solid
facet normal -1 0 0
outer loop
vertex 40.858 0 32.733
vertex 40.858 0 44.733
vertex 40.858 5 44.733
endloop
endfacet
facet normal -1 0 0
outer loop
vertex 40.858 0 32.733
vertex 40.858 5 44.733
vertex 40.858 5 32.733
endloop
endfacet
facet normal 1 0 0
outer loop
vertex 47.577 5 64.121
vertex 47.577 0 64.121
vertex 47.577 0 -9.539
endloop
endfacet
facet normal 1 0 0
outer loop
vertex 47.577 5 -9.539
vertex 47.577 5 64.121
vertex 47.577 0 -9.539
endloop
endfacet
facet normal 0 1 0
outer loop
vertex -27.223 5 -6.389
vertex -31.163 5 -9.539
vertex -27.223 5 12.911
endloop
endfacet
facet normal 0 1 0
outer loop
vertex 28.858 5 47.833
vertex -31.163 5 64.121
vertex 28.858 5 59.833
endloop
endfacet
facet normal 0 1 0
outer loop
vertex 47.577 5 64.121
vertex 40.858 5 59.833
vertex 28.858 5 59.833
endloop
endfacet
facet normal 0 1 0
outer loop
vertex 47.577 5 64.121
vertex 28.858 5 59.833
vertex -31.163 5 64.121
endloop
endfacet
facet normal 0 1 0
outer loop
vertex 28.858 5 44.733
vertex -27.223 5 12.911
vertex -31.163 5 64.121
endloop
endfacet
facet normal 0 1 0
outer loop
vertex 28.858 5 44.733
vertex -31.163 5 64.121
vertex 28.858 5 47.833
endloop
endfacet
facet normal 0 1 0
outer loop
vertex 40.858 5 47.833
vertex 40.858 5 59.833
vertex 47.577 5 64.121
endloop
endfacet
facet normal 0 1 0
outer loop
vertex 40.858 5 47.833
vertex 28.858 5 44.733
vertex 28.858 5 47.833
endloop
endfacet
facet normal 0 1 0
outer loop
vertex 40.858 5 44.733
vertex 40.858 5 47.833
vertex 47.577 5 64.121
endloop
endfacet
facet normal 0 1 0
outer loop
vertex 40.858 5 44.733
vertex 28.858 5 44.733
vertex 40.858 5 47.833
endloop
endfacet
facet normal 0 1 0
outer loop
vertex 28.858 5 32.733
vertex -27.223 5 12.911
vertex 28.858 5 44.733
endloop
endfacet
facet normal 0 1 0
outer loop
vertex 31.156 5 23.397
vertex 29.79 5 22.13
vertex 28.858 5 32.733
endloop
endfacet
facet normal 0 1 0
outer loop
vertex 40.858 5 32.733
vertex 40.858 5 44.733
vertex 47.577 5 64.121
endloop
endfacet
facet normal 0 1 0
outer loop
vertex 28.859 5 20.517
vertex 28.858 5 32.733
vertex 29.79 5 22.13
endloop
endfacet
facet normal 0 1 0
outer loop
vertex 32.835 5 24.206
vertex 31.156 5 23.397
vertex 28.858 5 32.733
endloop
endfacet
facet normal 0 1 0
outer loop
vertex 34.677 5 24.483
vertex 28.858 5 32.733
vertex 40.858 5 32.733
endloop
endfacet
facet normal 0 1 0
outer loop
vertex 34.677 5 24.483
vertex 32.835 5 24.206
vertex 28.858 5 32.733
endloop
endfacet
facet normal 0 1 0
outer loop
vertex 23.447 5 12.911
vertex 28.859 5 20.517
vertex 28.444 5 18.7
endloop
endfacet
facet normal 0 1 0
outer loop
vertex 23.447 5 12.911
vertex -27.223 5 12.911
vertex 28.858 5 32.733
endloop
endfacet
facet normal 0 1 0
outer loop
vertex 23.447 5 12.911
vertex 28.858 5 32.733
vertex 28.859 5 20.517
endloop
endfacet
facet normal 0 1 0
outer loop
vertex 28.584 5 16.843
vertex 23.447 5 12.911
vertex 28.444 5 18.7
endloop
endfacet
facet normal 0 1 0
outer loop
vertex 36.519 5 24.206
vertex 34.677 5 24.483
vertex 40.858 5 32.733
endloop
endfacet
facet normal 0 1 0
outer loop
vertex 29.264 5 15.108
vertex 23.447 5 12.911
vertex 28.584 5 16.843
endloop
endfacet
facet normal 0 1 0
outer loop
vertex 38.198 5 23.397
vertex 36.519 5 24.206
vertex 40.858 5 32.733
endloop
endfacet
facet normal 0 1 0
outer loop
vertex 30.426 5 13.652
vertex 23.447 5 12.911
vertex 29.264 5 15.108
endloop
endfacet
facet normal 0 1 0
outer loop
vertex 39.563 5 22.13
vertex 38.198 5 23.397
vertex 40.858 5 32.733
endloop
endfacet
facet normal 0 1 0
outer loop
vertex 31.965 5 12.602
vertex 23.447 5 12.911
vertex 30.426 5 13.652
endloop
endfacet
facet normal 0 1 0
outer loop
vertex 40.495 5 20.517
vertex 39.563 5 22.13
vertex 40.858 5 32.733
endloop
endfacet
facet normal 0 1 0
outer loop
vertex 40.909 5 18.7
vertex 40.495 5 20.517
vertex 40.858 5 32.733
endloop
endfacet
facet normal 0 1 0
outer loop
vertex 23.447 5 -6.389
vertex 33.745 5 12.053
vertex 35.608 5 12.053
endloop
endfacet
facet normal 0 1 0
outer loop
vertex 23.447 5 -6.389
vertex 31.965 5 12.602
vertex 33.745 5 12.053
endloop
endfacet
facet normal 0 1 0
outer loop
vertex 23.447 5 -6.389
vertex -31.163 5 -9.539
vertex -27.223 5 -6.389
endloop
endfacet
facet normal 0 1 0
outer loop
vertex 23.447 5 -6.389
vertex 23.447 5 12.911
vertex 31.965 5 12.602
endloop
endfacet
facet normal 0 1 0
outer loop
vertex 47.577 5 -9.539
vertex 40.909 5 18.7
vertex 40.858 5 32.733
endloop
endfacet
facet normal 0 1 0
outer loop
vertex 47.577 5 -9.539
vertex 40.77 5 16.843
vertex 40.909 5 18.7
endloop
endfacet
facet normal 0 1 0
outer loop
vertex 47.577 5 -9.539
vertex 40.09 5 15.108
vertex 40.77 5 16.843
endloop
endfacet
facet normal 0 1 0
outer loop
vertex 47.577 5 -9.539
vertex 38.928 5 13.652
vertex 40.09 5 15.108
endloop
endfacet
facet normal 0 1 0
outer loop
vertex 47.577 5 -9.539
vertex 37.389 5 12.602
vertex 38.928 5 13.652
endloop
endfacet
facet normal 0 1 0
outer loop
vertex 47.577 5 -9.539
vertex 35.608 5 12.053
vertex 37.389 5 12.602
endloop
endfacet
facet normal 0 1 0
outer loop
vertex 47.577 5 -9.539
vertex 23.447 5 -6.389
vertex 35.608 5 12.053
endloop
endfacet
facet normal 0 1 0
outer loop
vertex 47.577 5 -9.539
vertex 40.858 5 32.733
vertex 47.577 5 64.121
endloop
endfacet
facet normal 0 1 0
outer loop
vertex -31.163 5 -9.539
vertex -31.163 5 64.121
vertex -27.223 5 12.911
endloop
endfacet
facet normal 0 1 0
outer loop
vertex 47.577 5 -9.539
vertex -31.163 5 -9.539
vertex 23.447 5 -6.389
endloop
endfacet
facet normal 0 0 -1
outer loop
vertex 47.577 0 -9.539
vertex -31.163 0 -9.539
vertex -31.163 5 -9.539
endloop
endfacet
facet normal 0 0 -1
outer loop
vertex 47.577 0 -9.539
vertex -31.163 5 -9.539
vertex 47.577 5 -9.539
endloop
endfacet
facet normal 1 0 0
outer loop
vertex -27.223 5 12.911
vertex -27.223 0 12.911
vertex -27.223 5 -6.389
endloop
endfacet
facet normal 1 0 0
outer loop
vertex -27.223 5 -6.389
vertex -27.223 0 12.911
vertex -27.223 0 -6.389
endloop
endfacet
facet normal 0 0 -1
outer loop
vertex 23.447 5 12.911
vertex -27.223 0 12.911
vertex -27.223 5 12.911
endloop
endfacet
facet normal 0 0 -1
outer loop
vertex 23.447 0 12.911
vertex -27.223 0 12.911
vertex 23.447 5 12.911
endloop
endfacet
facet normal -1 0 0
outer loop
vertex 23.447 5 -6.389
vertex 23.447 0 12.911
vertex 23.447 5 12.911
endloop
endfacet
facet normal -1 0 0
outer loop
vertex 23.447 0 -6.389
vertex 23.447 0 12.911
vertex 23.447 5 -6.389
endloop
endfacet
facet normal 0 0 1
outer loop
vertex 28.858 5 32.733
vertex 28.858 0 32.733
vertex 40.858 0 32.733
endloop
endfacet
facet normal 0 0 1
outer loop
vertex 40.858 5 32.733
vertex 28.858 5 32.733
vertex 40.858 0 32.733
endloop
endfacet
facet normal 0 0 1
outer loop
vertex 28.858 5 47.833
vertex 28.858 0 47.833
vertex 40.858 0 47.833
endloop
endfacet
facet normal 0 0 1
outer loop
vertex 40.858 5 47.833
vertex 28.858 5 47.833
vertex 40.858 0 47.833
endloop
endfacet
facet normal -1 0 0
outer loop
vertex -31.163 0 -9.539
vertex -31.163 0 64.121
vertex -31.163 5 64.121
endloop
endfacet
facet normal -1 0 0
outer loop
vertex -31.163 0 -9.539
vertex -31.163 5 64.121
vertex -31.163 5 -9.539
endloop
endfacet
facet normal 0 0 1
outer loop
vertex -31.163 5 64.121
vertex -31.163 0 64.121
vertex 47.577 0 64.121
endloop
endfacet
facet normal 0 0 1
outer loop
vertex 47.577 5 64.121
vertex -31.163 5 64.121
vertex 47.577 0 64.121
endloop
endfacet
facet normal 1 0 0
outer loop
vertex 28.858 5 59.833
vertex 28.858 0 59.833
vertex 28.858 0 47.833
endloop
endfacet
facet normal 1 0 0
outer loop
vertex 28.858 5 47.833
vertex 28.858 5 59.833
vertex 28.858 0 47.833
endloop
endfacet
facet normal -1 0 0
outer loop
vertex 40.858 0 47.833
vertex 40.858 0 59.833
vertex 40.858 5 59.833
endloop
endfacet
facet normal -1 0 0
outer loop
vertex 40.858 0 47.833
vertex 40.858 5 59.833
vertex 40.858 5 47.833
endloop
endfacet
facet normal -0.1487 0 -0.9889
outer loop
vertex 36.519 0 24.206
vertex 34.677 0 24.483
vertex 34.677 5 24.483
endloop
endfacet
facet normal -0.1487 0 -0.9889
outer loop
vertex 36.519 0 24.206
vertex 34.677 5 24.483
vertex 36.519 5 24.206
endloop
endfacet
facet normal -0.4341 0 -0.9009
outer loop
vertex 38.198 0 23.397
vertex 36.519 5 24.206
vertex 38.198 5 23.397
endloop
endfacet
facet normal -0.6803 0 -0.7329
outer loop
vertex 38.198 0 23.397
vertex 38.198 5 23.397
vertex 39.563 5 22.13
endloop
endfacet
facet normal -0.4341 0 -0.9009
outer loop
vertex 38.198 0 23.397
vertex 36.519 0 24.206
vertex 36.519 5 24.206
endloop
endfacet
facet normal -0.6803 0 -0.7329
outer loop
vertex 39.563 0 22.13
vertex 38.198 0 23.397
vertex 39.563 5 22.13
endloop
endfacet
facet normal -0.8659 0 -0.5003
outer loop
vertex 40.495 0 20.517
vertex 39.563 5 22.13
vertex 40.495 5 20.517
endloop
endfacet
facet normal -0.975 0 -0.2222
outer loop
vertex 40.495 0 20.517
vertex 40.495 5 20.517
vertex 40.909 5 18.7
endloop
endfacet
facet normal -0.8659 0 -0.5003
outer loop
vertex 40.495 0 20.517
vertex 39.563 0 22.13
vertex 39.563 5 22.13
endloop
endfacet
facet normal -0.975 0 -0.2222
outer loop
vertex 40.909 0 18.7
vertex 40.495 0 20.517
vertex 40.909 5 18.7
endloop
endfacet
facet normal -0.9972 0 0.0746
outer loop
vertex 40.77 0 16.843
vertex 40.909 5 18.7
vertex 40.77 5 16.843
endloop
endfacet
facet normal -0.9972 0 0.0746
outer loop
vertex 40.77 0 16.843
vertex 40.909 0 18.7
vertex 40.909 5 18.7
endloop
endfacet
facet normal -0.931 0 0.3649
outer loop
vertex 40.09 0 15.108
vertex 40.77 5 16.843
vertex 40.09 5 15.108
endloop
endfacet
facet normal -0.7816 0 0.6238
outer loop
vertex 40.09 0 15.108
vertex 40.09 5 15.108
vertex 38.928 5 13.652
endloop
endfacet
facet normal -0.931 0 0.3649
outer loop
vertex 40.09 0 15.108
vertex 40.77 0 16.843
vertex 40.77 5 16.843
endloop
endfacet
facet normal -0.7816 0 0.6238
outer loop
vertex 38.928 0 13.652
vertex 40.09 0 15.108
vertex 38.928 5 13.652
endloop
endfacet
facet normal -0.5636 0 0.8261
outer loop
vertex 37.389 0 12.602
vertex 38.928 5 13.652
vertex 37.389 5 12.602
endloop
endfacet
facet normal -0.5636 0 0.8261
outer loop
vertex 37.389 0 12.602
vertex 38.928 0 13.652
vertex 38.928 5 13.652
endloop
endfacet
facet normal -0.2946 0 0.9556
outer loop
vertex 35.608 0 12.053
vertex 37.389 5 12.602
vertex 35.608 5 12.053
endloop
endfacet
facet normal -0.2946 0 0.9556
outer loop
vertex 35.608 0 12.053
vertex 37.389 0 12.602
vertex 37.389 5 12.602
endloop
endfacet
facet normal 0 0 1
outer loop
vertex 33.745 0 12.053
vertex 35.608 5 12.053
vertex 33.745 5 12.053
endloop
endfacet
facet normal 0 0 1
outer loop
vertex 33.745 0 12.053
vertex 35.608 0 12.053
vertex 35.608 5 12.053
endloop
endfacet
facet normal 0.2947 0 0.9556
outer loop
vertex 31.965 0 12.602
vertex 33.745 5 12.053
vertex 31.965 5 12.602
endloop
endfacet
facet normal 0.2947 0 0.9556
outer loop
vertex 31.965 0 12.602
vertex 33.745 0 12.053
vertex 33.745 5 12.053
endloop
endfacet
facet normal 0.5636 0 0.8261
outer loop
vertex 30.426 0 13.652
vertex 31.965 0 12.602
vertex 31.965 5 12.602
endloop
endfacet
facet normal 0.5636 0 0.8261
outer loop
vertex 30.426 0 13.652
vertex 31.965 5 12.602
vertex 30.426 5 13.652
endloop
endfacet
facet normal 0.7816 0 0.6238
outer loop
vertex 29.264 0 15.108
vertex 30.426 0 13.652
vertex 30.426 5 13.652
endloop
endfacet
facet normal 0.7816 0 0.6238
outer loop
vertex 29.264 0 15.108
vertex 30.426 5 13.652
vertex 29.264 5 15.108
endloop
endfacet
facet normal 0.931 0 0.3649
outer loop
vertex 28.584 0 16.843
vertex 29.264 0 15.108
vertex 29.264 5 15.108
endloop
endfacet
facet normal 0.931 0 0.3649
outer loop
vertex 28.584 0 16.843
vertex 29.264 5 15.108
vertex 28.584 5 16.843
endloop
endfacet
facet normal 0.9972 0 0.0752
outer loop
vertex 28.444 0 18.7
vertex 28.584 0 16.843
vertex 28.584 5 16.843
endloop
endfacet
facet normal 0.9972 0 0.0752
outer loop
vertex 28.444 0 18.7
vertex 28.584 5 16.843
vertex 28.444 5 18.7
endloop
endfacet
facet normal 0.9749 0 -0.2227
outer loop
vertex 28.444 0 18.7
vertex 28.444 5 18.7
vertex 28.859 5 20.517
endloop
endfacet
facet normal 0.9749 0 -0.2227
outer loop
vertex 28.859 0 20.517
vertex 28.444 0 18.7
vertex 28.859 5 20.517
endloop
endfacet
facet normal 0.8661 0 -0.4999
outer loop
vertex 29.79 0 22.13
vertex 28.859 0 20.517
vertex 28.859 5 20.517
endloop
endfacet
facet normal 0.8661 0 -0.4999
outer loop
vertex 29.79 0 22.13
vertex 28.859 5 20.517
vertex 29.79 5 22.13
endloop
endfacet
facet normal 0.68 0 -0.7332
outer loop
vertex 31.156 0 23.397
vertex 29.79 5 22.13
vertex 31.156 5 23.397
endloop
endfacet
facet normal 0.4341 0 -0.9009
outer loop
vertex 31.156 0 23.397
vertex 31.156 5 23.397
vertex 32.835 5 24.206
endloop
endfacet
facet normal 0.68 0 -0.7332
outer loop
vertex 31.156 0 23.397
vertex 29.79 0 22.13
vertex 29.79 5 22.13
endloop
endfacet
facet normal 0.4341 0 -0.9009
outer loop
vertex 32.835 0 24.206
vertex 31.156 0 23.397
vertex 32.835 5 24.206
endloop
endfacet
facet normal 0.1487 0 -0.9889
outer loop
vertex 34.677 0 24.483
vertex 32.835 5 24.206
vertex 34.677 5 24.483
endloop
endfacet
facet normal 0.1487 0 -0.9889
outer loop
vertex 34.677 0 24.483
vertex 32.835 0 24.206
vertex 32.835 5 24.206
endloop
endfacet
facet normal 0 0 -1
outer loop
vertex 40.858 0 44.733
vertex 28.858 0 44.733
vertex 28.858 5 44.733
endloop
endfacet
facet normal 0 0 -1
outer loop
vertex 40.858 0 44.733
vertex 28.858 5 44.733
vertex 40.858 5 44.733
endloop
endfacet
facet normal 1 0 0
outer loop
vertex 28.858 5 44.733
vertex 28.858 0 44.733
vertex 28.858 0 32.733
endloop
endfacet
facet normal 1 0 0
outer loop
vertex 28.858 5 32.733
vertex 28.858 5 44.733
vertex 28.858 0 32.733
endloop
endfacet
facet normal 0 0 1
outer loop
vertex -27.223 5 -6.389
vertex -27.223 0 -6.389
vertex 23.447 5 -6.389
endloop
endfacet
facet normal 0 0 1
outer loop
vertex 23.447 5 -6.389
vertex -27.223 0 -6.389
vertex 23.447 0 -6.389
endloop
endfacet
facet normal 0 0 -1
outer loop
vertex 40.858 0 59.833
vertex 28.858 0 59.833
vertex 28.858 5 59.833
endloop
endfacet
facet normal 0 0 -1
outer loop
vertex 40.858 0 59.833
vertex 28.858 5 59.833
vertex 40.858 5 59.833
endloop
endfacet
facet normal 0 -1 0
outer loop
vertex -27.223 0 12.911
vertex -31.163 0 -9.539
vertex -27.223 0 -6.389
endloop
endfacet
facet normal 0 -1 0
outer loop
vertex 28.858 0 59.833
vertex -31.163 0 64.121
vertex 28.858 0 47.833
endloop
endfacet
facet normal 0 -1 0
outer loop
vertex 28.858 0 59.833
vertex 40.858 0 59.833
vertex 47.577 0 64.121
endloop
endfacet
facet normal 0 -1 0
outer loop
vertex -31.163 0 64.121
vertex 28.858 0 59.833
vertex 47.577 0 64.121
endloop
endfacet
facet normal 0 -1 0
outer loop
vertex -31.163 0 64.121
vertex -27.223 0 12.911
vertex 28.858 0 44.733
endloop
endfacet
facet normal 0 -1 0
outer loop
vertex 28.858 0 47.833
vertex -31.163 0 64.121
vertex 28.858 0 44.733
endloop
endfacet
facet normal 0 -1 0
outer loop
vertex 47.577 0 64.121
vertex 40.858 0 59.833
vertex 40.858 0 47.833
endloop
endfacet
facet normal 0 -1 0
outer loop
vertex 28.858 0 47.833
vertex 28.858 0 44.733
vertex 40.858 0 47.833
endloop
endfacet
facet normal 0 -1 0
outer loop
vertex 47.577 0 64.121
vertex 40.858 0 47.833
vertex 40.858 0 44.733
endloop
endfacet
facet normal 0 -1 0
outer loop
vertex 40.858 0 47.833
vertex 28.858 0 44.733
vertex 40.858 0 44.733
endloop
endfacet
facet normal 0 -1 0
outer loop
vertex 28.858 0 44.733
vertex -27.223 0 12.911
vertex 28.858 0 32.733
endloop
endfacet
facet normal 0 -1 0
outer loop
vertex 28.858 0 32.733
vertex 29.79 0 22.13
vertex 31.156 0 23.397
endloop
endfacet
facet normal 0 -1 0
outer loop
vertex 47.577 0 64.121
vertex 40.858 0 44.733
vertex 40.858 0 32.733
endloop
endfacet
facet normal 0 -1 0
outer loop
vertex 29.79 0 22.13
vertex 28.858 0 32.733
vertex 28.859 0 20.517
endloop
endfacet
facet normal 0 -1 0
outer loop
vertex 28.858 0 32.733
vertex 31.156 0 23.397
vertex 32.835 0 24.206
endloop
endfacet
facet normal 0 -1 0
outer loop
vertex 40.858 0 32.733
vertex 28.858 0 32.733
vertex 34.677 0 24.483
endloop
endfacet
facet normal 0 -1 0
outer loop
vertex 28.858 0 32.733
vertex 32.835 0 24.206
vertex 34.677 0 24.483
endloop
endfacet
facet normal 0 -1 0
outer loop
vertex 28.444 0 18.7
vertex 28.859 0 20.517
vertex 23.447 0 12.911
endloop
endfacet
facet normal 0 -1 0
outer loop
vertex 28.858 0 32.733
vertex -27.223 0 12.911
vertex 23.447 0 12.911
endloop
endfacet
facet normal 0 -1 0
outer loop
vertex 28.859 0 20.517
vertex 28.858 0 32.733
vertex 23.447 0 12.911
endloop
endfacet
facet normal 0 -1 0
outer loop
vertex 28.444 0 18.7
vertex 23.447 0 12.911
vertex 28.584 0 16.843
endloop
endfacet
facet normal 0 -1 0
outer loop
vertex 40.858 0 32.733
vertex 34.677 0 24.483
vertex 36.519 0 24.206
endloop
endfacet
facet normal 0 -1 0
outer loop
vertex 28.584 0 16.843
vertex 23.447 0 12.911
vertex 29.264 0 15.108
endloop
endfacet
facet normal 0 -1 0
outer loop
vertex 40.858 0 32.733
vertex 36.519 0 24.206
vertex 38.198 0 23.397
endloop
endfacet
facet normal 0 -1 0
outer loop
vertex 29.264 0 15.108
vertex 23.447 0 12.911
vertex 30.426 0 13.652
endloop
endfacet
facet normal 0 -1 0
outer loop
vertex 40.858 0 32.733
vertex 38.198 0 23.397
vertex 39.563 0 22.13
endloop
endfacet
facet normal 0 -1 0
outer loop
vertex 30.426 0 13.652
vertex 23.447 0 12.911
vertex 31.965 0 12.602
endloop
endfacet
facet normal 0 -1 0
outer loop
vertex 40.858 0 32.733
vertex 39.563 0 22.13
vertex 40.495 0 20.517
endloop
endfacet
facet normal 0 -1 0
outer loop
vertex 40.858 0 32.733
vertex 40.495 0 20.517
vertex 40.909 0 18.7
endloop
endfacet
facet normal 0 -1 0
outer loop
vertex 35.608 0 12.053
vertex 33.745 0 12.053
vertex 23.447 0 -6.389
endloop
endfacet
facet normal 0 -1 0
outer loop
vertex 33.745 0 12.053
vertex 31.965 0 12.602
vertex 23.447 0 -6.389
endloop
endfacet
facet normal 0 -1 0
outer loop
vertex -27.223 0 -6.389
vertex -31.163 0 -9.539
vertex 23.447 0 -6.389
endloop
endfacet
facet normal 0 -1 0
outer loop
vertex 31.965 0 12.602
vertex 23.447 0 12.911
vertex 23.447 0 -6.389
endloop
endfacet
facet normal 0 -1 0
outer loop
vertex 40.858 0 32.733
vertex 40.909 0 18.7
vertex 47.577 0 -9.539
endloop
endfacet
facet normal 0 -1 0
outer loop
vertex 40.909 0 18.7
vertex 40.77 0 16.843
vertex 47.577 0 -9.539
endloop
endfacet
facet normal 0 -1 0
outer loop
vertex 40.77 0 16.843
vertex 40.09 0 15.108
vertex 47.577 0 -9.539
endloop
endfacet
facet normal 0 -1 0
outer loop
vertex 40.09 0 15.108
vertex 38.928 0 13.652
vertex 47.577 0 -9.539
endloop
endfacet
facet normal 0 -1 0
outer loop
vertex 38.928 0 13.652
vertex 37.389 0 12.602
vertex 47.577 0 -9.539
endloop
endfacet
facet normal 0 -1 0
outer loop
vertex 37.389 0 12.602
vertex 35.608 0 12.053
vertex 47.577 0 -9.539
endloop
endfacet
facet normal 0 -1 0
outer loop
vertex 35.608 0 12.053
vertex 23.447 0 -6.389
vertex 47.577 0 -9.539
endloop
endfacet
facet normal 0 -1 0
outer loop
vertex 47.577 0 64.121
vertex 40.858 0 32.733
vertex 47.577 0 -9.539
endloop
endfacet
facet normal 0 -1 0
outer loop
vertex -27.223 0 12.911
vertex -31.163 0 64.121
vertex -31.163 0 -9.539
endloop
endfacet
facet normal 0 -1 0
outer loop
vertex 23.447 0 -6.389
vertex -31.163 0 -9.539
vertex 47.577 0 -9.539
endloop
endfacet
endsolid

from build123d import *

# Parameters (mm, degrees)
SKETCH1_W           = 78.74
SKETCH1_H           = 73.66
SKETCH1_R           = 6.25
SKETCH1_W_2         = 50.67
SKETCH1_H_2         = 19.3
SKETCH1_W_3         = 12
SKETCH1_H_3         = 12
BOSS_EXTRUDE1_DEPTH = 5


with BuildPart() as part:
    # Sketch1 → Boss-Extrude1 (new body)
    with BuildSketch(Plane(origin=(0, 0, 0), x_dir=(1, 0, 0), z_dir=(0, 1, 0))):
        with Locations((8.206850447, -27.291358184)):
            Rectangle(SKETCH1_W, SKETCH1_H)
        with Locations(Location((34.676850447, -18.233358184, 0), (0, 0, 270))):
            Circle(SKETCH1_R, mode=Mode.SUBTRACT)
        with Locations((-1.888149553, -3.261358184)):
            Rectangle(SKETCH1_W_2, SKETCH1_H_2, mode=Mode.SUBTRACT)
        with Locations((34.857850447, -38.733358184)):
            Rectangle(SKETCH1_W_3, SKETCH1_H_3, mode=Mode.SUBTRACT)
        with Locations((34.857850447, -53.833358184)):
            Rectangle(SKETCH1_W_3, SKETCH1_H_3, mode=Mode.SUBTRACT)
    extrude(amount=BOSS_EXTRUDE1_DEPTH)


solid = part.part
